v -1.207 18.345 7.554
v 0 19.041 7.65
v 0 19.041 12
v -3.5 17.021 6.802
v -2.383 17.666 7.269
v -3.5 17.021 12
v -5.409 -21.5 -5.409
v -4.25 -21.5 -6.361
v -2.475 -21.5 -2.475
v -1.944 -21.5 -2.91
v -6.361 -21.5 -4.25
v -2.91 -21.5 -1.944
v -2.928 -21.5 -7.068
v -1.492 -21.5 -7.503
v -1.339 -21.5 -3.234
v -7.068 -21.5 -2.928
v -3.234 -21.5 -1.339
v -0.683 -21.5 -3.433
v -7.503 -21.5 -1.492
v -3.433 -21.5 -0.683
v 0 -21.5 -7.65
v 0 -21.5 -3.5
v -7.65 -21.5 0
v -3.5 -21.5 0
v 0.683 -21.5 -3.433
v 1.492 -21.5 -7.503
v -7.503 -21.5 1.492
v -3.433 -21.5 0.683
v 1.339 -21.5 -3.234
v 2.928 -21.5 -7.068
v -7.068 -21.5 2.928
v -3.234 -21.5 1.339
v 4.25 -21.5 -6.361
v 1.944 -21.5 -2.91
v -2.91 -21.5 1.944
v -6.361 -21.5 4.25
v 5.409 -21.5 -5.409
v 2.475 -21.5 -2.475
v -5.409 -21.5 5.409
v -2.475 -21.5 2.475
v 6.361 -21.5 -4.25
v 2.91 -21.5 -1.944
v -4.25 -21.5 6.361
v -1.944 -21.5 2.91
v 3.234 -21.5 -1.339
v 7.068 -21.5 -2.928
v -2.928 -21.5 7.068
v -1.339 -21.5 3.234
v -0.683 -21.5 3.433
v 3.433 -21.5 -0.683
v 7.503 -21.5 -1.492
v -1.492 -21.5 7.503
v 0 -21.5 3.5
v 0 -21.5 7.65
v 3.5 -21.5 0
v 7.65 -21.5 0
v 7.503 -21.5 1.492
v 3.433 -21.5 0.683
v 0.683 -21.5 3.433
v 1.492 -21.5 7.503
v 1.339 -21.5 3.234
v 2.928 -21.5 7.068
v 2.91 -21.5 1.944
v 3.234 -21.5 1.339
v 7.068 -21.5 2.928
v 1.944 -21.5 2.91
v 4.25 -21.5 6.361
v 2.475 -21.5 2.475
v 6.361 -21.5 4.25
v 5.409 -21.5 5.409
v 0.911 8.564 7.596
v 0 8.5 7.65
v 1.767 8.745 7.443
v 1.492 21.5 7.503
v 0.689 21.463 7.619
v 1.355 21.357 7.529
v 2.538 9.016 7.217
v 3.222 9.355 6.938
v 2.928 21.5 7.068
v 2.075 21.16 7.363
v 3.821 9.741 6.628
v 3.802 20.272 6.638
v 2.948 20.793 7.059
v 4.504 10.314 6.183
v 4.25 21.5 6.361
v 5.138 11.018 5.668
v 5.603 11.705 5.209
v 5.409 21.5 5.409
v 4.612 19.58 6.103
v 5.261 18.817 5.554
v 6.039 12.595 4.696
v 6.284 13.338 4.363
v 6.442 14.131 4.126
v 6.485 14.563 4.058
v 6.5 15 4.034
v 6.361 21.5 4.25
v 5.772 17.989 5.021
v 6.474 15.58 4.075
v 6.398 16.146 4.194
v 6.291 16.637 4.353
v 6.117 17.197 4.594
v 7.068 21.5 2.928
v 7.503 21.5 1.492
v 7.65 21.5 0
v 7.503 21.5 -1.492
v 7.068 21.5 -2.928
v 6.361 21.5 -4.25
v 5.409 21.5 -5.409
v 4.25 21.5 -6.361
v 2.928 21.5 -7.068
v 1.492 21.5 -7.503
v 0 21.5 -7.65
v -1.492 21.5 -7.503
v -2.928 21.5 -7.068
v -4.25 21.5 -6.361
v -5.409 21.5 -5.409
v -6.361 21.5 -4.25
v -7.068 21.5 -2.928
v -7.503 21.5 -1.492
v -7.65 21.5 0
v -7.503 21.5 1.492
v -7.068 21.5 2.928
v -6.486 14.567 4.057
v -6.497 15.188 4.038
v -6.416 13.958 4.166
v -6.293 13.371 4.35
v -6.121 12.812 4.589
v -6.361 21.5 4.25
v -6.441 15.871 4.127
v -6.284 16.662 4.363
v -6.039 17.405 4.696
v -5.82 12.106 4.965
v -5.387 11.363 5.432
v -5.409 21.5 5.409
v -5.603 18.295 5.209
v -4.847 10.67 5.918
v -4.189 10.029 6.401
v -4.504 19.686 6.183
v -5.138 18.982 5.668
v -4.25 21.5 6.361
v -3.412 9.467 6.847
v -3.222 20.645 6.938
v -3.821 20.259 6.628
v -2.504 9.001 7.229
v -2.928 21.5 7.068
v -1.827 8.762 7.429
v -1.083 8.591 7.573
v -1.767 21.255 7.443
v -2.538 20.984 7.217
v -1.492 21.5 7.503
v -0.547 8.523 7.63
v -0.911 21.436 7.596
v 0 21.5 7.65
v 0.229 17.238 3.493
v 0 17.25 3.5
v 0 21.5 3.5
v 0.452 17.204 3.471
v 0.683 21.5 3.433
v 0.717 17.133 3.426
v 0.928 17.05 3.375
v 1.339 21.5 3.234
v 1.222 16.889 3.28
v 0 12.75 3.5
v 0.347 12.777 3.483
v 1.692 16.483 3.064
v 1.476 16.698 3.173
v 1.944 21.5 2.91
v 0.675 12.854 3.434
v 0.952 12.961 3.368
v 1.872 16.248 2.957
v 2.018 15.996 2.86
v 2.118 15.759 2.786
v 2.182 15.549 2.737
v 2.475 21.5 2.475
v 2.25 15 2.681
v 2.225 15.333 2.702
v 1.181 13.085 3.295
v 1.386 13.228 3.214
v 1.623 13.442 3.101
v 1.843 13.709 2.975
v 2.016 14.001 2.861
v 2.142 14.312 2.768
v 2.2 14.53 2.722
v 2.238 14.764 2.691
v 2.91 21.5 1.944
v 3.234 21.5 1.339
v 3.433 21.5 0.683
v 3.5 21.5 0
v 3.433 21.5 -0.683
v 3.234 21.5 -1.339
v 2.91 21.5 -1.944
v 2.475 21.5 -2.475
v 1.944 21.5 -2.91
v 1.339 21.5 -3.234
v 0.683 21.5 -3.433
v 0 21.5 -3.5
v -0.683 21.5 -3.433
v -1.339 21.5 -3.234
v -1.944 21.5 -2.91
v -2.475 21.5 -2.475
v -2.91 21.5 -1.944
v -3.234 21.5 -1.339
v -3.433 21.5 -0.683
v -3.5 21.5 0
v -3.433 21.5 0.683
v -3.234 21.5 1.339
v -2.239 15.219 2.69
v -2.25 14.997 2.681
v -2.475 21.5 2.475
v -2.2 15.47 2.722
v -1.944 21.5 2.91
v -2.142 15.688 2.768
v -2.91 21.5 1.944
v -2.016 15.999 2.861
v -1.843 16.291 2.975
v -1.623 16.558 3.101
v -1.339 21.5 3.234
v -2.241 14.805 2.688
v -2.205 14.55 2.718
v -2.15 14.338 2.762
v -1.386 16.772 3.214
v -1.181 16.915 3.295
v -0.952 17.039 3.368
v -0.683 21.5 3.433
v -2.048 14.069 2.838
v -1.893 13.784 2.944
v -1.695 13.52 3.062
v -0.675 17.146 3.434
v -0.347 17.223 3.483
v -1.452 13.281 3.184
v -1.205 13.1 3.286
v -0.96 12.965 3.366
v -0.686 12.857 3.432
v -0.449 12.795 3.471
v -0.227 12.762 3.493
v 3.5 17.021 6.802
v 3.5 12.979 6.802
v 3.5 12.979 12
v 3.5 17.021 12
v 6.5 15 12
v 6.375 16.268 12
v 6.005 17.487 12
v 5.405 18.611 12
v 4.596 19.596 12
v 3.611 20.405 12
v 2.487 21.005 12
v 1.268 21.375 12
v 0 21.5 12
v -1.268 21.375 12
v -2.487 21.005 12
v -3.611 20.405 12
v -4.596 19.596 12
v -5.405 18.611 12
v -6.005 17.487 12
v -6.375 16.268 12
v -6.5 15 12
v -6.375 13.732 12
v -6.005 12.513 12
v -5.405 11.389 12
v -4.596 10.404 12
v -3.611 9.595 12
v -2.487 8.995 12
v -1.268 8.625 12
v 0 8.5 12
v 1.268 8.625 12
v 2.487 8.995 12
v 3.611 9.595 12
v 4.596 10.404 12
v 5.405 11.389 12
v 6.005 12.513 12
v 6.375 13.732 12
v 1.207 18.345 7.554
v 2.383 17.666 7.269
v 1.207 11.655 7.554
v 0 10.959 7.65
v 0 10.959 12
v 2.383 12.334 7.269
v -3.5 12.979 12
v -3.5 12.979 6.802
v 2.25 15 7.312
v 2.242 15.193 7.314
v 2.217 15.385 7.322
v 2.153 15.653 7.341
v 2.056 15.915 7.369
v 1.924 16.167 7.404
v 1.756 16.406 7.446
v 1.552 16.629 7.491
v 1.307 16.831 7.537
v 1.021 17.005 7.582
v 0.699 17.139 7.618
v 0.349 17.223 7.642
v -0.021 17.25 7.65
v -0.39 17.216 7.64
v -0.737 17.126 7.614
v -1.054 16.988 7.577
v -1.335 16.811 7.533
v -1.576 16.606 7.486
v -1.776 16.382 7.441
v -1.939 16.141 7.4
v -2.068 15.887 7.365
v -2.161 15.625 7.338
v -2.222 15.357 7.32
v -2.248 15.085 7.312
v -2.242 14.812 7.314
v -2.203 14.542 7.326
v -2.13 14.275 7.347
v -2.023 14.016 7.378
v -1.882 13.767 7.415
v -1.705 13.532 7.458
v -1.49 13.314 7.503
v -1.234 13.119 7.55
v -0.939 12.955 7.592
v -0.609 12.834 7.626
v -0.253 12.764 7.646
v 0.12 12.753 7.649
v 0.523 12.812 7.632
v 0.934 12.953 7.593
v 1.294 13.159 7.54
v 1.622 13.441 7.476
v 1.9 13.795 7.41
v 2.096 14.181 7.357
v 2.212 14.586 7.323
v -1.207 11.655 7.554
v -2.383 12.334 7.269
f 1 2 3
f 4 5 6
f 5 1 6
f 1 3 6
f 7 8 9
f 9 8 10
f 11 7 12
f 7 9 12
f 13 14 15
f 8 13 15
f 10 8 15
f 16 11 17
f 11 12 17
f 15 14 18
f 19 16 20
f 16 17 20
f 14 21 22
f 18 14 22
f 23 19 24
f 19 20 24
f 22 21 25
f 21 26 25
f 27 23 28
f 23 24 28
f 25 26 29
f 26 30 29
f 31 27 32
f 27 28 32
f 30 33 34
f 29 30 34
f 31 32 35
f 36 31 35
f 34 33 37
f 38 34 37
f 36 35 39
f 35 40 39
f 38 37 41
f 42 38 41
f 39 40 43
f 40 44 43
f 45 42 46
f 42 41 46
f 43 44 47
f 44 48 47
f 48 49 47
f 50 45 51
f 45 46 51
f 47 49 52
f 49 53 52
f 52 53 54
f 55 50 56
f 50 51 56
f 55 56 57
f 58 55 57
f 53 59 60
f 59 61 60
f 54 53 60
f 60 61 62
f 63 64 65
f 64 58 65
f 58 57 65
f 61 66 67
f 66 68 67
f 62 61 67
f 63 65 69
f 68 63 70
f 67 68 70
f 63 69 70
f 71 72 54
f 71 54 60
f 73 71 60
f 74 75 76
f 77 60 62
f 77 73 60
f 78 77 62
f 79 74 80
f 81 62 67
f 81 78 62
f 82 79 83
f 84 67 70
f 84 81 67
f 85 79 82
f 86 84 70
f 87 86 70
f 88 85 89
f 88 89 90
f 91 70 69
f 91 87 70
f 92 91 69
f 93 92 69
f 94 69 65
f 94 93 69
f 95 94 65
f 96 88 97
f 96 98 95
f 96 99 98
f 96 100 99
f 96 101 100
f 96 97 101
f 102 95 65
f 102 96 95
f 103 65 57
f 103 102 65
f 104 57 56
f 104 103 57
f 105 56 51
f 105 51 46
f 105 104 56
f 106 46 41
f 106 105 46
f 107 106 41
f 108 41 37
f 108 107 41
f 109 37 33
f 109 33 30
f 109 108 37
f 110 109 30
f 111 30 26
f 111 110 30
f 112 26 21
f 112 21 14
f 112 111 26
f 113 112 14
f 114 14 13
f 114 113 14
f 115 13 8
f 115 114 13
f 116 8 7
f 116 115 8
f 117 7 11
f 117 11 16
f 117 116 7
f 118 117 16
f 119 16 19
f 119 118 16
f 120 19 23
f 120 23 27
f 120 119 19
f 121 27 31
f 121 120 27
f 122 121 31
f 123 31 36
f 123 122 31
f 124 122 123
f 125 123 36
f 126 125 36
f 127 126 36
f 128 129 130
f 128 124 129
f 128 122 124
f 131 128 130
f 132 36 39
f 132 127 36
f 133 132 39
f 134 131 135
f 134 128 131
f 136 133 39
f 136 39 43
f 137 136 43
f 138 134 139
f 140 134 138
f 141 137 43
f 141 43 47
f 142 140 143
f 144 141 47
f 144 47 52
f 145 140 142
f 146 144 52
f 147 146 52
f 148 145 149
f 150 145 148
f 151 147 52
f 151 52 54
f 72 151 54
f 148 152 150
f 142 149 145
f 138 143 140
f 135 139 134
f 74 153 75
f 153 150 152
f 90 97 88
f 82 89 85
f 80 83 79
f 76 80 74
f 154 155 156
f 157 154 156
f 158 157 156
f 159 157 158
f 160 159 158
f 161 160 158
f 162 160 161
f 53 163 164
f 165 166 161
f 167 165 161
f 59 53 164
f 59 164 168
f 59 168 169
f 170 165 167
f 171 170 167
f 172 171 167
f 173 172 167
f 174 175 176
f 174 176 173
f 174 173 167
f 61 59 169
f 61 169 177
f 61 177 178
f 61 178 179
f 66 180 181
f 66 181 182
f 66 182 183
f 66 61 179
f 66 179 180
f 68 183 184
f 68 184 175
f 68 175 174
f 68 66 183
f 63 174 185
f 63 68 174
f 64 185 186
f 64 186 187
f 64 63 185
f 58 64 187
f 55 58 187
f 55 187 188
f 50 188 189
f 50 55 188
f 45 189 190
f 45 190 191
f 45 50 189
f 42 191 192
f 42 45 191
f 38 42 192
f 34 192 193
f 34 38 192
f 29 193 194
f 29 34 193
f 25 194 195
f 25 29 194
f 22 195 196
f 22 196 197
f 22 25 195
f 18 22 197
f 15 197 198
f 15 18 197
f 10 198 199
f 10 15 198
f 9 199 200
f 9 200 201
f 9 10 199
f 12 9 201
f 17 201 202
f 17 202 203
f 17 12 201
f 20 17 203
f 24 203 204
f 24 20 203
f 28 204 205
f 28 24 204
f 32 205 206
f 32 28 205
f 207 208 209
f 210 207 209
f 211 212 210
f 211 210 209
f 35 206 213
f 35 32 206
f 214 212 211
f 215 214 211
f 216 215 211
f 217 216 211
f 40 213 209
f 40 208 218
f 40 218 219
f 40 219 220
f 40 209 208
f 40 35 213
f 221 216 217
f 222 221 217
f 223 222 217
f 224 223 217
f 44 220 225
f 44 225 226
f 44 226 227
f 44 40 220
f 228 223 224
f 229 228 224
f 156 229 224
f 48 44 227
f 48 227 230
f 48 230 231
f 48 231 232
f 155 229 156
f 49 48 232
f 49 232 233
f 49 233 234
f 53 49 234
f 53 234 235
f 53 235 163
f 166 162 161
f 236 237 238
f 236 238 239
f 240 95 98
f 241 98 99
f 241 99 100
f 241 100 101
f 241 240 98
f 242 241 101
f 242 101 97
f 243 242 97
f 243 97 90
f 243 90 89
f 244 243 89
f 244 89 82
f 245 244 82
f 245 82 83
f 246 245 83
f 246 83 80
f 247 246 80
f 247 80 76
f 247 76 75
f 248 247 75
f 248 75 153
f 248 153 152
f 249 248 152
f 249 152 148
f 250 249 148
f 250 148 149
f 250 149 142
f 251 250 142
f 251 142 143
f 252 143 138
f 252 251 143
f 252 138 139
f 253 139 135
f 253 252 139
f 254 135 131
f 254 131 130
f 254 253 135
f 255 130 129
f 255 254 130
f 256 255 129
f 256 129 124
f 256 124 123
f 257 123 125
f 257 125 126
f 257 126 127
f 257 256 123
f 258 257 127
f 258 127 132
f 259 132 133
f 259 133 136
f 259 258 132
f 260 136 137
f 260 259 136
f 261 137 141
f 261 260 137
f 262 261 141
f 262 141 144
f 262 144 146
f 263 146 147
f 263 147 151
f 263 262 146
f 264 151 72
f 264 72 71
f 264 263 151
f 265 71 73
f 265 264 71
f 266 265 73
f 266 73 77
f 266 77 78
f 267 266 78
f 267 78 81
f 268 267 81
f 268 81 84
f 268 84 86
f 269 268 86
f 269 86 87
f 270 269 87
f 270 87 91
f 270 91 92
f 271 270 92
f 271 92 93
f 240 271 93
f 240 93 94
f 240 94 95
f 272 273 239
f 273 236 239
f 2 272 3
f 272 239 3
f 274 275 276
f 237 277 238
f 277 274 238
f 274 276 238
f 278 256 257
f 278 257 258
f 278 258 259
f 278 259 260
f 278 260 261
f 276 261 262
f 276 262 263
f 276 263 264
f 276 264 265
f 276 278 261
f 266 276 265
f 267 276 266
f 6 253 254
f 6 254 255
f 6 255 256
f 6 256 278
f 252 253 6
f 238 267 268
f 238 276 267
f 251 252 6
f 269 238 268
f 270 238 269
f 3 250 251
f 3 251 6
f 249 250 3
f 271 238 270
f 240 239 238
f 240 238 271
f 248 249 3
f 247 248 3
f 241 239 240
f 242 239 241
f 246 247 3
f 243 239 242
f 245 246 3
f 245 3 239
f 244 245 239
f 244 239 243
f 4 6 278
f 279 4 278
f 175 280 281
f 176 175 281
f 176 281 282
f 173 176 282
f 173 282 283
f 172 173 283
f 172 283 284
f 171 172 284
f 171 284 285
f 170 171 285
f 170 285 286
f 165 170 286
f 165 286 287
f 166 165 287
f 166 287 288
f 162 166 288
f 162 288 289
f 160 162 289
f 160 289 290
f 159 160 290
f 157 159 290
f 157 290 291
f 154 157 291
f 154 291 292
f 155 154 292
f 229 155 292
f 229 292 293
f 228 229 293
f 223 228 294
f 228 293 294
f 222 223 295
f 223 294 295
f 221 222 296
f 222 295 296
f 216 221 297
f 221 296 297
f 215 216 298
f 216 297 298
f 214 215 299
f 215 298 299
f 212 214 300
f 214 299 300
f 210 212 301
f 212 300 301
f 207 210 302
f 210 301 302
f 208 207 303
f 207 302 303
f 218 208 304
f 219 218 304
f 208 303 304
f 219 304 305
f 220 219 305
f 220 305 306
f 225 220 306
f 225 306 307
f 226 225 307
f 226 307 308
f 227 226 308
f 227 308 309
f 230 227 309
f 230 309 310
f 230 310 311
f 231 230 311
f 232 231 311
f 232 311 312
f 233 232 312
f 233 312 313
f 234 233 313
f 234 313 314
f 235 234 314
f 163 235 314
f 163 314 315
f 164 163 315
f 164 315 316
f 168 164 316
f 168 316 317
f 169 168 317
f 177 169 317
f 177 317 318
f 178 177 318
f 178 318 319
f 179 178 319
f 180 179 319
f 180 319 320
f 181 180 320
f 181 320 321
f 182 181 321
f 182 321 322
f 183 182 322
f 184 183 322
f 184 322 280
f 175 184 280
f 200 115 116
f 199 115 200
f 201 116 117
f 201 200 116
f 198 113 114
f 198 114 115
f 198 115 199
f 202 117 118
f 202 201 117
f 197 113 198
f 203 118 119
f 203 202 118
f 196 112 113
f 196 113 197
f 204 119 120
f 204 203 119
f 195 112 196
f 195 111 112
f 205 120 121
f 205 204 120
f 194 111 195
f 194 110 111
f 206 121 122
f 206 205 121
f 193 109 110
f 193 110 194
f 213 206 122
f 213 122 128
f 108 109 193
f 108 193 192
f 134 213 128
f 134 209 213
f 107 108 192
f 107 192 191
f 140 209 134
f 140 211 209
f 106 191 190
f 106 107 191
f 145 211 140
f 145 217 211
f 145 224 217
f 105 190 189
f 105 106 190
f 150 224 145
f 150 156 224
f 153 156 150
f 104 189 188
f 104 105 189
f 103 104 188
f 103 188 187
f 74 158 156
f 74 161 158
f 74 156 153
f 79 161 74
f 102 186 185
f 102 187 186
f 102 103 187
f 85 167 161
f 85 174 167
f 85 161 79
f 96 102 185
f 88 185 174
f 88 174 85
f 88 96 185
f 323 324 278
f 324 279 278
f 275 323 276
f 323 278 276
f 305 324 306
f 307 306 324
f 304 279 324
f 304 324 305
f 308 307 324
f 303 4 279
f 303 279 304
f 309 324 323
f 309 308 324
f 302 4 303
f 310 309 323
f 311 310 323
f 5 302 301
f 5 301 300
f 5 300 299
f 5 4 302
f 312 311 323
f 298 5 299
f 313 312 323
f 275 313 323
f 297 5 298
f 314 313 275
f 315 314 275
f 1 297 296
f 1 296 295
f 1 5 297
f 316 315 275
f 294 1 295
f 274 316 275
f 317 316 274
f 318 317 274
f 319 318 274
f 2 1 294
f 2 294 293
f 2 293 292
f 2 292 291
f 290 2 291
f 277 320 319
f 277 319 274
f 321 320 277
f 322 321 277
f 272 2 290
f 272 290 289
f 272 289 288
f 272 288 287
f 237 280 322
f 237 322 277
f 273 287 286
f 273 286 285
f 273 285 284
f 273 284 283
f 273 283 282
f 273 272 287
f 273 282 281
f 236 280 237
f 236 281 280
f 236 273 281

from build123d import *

# Parameters (mm, degrees)
CROQUIS1_R                   = 7.65
SALIENTE_EXTRUIR1_DEPTH      = 8.5
CROQUIS2_R                   = 7.65
CROQUIS2_R_2                 = 3.5
SALIENTE_EXTRUIR2_DEPTH      = 21.5
SALIENTE_EXTRUIR3_REACH      = 132.896
SALIENTE_EXTRUIR3_END_RADIUS = 7.65
SALIENTE_EXTRUIR3_START      = 12
CROQUIS3_R                   = 6.5
CORTAR_EXTRUIR1_REACH        = 129.309
CORTAR_EXTRUIR1_END_RADIUS   = 3.5
CROQUIS4_R                   = 2.25


with BuildPart() as part:
    # Croquis1 → Saliente-Extruir1 (new, symmetric)
    with BuildSketch(Plane(origin=(0, 0, 0), x_dir=(1, 0, 0), z_dir=(0, 1, 0))):
        with BuildLine():
            ThreePointArc((-18.62950636, 70.733830846), (-21.266037972, 78.379045573), (-29.224003483, 79.818278736))
            ThreePointArc((-29.224003483, 79.818278736), (-42.5, 73.612159322), (-54.51265533, 65.217868785))
            ThreePointArc((-54.51265533, 65.217868785), (-57.245225604, 57.606451909), (-51.942541239, 51.500541191))
            ThreePointArc((-51.942541239, 51.500541191), (-41.569219382, 24), (-70.572047599, 19.233289655))
            ThreePointArc((-70.572047599, 19.233289655), (-78.511263577, 20.772593665), (-83.736658814, 14.600409951))
            ThreePointArc((-83.736658814, 14.600409951), (-85, 0), (-83.736658814, -14.600409951))
            ThreePointArc((-83.736658814, -14.600409951), (-78.511263577, -20.772593665), (-70.572047599, -19.233289655))
            ThreePointArc((-70.572047599, -19.233289655), (-41.569219382, -24), (-51.942541239, -51.500541191))
            ThreePointArc((-51.942541239, -51.500541191), (-57.245225604, -57.606451909), (-54.51265533, -65.217868785))
            ThreePointArc((-54.51265533, -65.217868785), (-42.5, -73.612159322), (-29.224003483, -79.818278736))
            ThreePointArc((-29.224003483, -79.818278736), (-21.266037972, -78.379045573), (-18.62950636, -70.733830846))
            ThreePointArc((-18.62950636, -70.733830846), (0, -48), (18.62950636, -70.733830846))
            ThreePointArc((18.62950636, -70.733830846), (21.266037972, -78.379045573), (29.224003483, -79.818278736))
            ThreePointArc((29.224003483, -79.818278736), (42.5, -73.612159322), (54.51265533, -65.217868785))
            ThreePointArc((54.51265533, -65.217868785), (57.245225604, -57.606451909), (51.942541239, -51.500541191))
            ThreePointArc((51.942541239, -51.500541191), (41.569219382, -24), (70.572047599, -19.233289655))
            ThreePointArc((70.572047599, -19.233289655), (78.511263577, -20.772593665), (83.736658814, -14.600409951))
            ThreePointArc((83.736658814, -14.600409951), (85, 0), (83.736658814, 14.600409951))
            ThreePointArc((83.736658814, 14.600409951), (78.511263577, 20.772593665), (70.572047599, 19.233289655))
            ThreePointArc((70.572047599, 19.233289655), (41.569219382, 24), (51.942541239, 51.500541191))
            ThreePointArc((51.942541239, 51.500541191), (57.245225604, 57.606451909), (54.51265533, 65.217868785))
            ThreePointArc((54.51265533, 65.217868785), (42.5, 73.612159322), (29.224003483, 79.818278736))
            ThreePointArc((29.224003483, 79.818278736), (21.266037972, 78.379045573), (18.62950636, 70.733830846))
            ThreePointArc((18.62950636, 70.733830846), (0, 48), (-18.62950636, 70.733830846))
        make_face()
        with Locations(Location((0, 0, 0), (0, 0, 270))):
            Circle(CROQUIS1_R, mode=Mode.SUBTRACT)
    extrude(amount=SALIENTE_EXTRUIR1_DEPTH, both=True)


with BuildPart() as body_2:
    # Croquis2 → Saliente-Extruir2 (new body)
    with BuildSketch(Plane(origin=(0, 0, 0), x_dir=(1, 0, 0), z_dir=(0, 1, 0))):
        with Locations(Location((0, 0, 0), (0, 0, 270))):
            Circle(CROQUIS2_R)
        with Locations(Location((0, 0, 0), (0, 0, 270))):
            Circle(CROQUIS2_R_2, mode=Mode.SUBTRACT)
    extrude(amount=SALIENTE_EXTRUIR2_DEPTH)

    # Simetría3: body 2 across plane


with BuildPart() as body_2_1:
    add(body_2.part)
    add(body_2.part.mirror(Plane.ZX))

    # Saliente-Extruir3: up to this cylinder (the profile starts outside it)
    saliente_extruir3_end = Plane(origin=(0, 15, 0), z_dir=(0, -1, 0)) * Cylinder(SALIENTE_EXTRUIR3_END_RADIUS, 282.092, mode=Mode.PRIVATE)
    # Croquis3 → Saliente-Extruir3 (add, up to the surface)
    with BuildSketch(Plane.XY.offset(SALIENTE_EXTRUIR3_START), mode=Mode.PRIVATE) as saliente_extruir3_sk1:
        with Locations((0, 15)):
            Circle(CROQUIS3_R)
        Polygon((0, 10.958548116), (3.5, 12.979274058), (3.5, 17.020725942), (0, 19.041451884), (-3.5, 17.020725942), (-3.5, 12.979274058), align=None, mode=Mode.SUBTRACT)
    saliente_extruir3_tool1 = extrude(saliente_extruir3_sk1.sketch, amount=-SALIENTE_EXTRUIR3_REACH, mode=Mode.PRIVATE) - saliente_extruir3_end
    add(saliente_extruir3_tool1.solids().sort_by_distance((-6.316152, 15, 12))[0])

    # Cortar-Extruir1: up to this cylinder (the profile starts outside it)
    cortar_extruir1_end = Plane(origin=(0, 15, 0), z_dir=(0, -1, 0)) * Cylinder(CORTAR_EXTRUIR1_END_RADIUS, 266.618, mode=Mode.PRIVATE)
    # Croquis4 → Cortar-Extruir1 (cut, up to the surface)
    with BuildSketch(Plane.XY.offset(12), mode=Mode.PRIVATE) as cortar_extruir1_sk1:
        with Locations((0, 15)):
            Circle(CROQUIS4_R)
    cortar_extruir1_tool1 = extrude(cortar_extruir1_sk1.sketch, amount=-CORTAR_EXTRUIR1_REACH, mode=Mode.PRIVATE) - cortar_extruir1_end
    add(cortar_extruir1_tool1.solids().sort_by_distance((0, 15, 12))[0], mode=Mode.SUBTRACT)


solid = body_2_1.part
